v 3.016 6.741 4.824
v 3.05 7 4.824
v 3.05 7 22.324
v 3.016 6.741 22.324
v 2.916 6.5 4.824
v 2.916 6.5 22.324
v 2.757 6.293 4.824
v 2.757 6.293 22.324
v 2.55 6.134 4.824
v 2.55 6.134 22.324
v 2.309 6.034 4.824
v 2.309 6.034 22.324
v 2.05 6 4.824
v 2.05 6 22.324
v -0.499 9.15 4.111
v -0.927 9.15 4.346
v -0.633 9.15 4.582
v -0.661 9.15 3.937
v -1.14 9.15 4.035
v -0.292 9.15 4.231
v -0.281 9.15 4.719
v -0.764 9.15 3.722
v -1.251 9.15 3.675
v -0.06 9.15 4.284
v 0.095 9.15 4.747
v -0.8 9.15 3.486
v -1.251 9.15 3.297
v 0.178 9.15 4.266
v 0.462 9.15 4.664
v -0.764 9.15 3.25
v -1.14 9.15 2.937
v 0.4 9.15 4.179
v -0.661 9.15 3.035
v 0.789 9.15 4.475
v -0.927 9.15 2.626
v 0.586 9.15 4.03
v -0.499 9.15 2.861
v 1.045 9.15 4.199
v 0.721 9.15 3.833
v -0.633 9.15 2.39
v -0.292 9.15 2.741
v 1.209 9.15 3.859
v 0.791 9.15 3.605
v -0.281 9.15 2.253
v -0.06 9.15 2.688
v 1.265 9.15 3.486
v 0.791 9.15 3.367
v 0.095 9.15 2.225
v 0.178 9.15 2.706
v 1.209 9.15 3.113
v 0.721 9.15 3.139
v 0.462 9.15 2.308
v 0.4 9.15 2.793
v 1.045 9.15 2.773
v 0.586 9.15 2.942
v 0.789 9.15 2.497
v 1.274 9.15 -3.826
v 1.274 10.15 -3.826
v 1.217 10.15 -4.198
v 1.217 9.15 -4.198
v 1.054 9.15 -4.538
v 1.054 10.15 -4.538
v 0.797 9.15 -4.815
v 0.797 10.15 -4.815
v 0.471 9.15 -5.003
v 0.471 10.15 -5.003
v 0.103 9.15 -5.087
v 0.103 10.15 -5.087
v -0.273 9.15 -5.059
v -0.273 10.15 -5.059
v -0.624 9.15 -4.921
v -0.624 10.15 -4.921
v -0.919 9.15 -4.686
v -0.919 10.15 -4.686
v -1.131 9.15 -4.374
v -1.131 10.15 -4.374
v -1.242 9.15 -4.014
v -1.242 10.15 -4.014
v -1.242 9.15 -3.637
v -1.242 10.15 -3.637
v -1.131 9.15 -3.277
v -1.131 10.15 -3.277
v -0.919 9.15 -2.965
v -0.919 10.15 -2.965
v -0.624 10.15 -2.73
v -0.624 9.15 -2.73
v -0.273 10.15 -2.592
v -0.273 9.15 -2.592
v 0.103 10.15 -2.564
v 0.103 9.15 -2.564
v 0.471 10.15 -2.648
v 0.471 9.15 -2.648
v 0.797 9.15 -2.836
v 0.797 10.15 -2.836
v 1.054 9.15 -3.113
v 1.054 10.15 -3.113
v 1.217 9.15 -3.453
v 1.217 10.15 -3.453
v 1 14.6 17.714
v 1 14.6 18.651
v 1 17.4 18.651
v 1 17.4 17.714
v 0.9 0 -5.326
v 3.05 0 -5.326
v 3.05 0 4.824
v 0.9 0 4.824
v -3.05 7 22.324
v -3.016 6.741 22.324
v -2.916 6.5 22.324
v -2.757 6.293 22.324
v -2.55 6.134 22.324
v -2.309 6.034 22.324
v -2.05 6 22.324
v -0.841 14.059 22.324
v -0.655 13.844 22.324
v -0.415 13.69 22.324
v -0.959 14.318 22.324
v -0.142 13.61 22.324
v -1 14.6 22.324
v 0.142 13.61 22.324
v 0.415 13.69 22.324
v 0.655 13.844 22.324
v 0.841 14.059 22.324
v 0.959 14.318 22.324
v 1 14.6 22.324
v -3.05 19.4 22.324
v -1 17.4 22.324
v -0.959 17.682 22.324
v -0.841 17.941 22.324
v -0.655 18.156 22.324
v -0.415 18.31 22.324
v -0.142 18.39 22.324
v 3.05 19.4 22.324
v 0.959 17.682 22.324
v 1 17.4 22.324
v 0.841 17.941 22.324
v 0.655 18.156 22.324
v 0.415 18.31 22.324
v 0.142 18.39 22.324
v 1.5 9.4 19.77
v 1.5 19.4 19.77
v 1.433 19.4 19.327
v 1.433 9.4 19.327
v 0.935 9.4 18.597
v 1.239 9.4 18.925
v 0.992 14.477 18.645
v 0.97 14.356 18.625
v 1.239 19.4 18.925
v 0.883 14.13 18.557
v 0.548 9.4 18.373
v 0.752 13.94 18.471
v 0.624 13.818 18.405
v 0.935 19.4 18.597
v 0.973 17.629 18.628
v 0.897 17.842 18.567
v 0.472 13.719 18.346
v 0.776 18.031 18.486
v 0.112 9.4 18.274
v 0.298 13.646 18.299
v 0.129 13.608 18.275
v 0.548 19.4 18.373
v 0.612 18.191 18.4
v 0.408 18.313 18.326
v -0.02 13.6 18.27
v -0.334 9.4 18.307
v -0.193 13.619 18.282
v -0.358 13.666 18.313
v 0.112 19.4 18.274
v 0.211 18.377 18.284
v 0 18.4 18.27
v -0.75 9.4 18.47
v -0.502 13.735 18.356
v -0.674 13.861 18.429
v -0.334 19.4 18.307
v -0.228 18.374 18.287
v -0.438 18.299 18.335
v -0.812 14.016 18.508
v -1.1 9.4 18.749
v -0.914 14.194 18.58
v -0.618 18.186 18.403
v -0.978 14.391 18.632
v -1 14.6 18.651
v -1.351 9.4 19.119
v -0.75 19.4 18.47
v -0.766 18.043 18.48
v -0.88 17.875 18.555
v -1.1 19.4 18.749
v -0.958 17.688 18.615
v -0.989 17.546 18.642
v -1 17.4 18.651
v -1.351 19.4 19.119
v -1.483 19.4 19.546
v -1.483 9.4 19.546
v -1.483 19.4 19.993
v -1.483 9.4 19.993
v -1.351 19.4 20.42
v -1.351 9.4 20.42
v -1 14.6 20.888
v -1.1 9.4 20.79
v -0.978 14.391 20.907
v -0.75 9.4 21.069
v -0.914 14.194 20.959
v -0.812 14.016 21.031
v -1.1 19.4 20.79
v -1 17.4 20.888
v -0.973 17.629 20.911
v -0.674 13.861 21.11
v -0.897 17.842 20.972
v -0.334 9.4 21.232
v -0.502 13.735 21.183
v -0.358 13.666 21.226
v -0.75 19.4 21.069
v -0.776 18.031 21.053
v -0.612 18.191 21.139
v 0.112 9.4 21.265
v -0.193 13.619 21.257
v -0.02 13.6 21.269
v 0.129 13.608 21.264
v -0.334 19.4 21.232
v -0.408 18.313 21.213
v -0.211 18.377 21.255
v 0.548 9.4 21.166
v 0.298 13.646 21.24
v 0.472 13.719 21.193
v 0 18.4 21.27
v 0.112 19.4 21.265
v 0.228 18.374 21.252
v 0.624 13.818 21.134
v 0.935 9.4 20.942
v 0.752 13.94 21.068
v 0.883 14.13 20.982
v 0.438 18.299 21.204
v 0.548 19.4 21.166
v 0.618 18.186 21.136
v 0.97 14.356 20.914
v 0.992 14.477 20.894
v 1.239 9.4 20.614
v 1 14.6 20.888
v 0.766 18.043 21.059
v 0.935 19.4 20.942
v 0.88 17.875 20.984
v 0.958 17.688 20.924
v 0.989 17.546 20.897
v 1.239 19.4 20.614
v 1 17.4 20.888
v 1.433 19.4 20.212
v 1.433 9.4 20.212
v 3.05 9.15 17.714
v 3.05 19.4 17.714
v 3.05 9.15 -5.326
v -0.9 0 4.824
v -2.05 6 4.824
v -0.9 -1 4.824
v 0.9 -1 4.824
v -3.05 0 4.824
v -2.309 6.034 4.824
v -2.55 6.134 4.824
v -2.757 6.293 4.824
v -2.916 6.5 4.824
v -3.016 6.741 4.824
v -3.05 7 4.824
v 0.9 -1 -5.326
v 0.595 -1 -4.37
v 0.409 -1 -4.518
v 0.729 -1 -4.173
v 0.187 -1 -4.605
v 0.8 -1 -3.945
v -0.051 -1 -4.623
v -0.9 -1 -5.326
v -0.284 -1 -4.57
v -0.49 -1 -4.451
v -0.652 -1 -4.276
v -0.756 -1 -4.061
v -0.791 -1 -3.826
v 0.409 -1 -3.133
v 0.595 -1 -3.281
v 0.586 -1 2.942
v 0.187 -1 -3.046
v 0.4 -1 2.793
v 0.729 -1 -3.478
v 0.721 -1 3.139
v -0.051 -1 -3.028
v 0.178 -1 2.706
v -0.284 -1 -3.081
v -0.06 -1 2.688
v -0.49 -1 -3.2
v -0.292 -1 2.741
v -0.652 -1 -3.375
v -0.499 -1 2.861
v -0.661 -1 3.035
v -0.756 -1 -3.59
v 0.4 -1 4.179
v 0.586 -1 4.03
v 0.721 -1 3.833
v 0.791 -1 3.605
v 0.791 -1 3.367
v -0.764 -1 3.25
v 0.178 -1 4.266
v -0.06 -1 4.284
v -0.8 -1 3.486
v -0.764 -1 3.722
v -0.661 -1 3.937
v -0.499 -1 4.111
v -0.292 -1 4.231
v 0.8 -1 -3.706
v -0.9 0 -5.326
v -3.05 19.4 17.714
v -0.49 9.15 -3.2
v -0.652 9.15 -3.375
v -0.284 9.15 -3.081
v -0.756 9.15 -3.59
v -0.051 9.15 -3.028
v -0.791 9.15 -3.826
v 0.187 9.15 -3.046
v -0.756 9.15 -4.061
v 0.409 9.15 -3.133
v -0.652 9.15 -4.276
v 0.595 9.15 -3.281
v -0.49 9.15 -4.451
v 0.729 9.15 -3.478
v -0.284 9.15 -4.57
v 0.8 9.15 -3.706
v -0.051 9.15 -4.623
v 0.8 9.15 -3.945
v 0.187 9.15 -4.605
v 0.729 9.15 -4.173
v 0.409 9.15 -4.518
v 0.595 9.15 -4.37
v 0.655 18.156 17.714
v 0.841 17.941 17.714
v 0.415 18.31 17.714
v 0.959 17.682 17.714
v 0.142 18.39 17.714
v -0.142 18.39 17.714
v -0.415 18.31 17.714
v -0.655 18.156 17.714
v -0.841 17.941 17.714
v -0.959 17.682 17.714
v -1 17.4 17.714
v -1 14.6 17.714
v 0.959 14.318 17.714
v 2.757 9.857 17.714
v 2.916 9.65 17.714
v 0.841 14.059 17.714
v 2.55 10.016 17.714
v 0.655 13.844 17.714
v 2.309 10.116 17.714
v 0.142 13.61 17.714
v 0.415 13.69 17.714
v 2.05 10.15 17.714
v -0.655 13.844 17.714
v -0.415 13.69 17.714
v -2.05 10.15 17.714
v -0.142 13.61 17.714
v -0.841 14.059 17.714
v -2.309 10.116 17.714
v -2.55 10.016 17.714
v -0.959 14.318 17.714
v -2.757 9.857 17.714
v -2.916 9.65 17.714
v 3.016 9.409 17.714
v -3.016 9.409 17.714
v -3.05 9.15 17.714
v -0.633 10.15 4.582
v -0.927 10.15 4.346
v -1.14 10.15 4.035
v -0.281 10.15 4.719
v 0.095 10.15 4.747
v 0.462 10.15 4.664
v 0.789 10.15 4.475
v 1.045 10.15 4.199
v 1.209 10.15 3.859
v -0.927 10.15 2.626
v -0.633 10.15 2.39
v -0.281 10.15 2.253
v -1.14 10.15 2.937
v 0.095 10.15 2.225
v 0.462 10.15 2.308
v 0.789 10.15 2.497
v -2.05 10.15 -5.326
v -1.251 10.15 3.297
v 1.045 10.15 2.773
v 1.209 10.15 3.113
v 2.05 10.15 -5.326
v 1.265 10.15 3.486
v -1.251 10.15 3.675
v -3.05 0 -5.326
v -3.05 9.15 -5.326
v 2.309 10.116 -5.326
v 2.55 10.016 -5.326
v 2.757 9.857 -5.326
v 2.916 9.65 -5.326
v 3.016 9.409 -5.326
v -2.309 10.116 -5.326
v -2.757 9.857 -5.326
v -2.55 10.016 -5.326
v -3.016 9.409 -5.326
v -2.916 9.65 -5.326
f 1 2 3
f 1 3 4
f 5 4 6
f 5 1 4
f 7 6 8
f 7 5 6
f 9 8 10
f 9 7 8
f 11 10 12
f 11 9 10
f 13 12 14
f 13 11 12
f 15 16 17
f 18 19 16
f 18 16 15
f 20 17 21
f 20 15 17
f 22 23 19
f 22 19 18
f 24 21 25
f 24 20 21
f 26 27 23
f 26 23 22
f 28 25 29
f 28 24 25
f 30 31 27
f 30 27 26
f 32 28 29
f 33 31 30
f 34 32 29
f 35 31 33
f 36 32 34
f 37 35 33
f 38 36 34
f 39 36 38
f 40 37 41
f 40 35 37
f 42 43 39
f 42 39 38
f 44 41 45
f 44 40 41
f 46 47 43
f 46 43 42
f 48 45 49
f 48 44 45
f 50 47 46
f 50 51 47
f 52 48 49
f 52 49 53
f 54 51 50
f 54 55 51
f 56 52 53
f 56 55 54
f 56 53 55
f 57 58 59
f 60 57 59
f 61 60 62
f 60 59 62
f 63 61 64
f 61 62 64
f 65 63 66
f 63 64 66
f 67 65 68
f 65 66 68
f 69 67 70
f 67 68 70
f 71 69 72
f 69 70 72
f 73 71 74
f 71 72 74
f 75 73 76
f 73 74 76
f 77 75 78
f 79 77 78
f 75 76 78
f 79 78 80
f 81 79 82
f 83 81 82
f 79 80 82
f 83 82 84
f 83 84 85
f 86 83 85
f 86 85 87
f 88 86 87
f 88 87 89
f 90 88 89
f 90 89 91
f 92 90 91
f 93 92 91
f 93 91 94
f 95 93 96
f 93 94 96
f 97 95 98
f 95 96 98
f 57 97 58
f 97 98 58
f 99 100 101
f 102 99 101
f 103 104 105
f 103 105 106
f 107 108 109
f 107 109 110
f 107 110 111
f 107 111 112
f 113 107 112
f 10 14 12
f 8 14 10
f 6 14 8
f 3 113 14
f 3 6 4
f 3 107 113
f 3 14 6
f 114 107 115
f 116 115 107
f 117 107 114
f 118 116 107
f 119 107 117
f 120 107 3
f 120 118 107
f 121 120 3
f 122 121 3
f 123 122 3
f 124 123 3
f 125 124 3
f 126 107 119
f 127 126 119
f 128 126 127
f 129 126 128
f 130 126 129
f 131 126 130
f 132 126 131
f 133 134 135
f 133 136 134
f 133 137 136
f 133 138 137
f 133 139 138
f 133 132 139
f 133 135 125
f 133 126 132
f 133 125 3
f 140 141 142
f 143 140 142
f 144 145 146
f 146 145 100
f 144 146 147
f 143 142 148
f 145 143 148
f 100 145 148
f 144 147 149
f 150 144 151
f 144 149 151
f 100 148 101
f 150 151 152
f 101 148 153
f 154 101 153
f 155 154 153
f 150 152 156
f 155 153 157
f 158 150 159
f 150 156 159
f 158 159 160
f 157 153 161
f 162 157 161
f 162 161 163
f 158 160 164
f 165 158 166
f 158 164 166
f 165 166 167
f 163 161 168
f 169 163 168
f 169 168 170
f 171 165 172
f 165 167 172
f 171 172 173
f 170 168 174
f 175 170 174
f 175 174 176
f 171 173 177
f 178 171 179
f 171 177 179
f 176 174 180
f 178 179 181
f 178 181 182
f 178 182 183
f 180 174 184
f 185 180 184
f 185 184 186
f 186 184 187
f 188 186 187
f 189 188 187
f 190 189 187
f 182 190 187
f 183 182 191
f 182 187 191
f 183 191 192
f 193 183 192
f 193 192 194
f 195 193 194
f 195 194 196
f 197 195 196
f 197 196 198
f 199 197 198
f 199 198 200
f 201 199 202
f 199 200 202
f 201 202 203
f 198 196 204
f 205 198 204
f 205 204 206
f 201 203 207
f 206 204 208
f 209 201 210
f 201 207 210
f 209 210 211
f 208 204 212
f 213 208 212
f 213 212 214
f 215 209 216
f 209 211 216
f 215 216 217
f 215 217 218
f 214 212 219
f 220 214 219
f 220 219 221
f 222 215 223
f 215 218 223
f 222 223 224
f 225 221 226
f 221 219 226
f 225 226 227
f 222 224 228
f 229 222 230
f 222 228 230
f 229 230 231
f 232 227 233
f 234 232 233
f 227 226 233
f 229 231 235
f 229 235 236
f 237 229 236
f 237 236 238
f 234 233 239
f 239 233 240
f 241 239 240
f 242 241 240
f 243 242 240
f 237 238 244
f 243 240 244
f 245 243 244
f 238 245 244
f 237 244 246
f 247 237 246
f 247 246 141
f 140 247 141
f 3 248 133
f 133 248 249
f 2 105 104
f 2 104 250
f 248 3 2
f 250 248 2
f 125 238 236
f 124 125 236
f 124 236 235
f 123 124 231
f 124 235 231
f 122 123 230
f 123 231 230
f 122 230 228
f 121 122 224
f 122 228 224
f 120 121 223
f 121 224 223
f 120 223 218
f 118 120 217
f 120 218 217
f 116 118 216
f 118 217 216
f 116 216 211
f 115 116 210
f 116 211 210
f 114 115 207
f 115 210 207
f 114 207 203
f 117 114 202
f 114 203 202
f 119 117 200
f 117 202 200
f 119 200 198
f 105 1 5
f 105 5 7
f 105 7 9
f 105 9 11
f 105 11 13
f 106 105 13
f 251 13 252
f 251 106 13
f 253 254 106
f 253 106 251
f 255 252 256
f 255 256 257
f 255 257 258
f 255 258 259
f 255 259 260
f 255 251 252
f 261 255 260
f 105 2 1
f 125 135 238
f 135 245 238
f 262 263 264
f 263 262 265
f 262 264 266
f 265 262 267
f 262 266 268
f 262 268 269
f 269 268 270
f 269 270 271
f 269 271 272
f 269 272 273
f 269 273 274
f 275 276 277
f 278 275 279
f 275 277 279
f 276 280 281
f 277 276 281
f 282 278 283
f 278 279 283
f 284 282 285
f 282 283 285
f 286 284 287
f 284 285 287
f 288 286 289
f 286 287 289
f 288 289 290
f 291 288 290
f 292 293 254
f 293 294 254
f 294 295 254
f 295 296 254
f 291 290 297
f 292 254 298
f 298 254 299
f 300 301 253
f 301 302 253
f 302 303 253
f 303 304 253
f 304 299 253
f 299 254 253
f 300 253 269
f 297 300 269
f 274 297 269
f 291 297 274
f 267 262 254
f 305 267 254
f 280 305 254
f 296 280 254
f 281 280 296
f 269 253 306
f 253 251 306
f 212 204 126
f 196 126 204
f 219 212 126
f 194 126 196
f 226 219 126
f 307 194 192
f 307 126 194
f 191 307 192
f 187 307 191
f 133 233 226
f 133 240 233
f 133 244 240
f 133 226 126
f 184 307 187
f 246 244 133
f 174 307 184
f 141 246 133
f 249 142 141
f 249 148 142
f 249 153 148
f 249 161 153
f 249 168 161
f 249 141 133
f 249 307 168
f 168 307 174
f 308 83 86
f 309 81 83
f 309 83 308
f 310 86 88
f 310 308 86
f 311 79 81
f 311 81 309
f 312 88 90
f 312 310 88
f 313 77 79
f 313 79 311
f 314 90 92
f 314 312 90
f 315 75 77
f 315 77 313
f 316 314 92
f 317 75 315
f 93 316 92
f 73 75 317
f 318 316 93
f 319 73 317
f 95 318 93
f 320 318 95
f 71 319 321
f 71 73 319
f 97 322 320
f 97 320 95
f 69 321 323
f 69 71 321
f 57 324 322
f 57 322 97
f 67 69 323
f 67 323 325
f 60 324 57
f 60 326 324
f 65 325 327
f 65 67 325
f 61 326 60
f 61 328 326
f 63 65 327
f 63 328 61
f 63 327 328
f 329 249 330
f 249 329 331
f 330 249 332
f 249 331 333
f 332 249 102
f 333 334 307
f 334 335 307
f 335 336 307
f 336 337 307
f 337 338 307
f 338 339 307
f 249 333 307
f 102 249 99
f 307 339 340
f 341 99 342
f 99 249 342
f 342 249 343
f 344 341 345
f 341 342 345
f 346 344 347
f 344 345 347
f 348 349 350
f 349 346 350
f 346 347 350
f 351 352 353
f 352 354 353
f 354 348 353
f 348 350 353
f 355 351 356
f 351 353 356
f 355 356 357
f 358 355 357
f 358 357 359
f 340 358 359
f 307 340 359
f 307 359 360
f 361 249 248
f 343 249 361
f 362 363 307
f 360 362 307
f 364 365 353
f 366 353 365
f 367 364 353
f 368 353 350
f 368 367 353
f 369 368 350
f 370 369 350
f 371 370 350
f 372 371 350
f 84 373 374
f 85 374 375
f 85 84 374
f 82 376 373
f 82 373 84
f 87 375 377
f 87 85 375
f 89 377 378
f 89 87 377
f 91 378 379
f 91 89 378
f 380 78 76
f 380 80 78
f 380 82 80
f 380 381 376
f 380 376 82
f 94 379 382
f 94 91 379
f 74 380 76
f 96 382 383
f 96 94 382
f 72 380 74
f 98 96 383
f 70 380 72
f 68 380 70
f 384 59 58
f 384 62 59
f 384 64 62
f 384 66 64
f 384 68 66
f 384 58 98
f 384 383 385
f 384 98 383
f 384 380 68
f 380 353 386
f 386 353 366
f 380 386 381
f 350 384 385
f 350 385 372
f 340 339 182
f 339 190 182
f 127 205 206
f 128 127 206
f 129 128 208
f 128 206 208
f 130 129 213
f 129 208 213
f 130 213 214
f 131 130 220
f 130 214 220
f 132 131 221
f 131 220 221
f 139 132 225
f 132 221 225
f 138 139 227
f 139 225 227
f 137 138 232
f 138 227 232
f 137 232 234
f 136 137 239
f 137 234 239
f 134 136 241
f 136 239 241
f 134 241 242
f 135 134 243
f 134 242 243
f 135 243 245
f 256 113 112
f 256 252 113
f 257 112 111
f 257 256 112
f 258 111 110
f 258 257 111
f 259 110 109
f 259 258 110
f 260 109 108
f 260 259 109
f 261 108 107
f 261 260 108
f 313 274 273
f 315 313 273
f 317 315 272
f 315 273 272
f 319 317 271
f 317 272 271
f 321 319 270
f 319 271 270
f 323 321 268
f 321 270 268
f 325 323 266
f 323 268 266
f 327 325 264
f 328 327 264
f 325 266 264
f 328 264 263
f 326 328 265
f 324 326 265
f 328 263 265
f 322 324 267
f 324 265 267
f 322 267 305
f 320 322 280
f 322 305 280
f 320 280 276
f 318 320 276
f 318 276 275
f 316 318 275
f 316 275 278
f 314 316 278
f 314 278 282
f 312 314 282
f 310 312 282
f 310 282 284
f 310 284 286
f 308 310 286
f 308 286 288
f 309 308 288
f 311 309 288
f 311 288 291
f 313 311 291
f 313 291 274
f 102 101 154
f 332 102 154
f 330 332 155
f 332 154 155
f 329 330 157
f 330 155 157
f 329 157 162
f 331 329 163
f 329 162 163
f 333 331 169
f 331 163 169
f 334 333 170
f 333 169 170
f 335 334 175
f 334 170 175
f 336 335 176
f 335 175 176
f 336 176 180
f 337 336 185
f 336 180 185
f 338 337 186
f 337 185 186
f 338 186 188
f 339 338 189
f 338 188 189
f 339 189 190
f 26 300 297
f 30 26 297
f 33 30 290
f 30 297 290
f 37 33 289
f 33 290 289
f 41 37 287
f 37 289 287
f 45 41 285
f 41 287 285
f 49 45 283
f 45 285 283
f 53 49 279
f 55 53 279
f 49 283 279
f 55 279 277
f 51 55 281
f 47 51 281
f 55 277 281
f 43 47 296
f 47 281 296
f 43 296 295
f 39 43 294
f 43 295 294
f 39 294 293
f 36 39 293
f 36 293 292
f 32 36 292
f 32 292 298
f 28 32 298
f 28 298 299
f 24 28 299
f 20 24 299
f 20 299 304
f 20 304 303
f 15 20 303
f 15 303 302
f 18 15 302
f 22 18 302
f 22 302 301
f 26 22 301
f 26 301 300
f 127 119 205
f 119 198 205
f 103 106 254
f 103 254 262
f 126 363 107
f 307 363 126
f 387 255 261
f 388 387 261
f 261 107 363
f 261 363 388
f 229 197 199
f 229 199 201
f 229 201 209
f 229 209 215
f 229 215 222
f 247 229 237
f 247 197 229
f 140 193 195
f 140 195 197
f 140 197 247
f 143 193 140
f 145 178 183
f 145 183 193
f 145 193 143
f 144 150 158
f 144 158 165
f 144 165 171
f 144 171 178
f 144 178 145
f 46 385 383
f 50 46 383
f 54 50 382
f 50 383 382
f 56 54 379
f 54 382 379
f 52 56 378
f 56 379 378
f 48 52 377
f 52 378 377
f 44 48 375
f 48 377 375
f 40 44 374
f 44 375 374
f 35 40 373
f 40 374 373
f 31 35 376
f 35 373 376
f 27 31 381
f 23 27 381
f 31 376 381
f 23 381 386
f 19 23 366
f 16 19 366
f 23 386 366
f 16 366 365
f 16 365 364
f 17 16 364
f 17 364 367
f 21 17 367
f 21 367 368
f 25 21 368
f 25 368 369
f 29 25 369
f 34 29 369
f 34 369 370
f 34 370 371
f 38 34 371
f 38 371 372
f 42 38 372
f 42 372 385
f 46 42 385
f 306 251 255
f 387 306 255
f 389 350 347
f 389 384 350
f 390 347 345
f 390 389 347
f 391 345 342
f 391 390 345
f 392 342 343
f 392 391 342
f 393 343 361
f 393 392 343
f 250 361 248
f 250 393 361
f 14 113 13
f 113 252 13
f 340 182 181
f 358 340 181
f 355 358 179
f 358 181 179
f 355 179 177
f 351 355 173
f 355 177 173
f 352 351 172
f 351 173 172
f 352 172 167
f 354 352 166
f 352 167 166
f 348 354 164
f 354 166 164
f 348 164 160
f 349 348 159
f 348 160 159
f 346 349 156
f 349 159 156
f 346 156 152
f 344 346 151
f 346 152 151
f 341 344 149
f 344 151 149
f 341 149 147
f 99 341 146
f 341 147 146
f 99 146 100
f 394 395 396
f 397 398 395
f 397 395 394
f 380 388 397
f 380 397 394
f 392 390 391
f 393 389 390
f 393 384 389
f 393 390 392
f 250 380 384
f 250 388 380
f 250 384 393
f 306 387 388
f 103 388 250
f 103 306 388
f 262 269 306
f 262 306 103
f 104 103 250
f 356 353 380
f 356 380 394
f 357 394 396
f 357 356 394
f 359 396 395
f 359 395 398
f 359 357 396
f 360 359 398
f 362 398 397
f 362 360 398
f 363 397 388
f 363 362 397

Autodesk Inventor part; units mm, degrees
ref_plane "YZ Plane" through (0, 0, 0) normal (1, 0, 0) x (0, 1, 0)
ref_plane "XZ Plane" through (0, 0, 0) normal (0, 1, 0) x (-1, 0, 0)
ref_plane "XY Plane" through (0, 0, 0) normal (0, 0, 1) x (1, 0, 0)
sketch "Sketch1" plane through (0, 0, 0) normal (0, 1, 0) x (-1, 0, 0)
  line L0 (3.05, -5.3255) -> (-3.05, -5.3255)
  line L1 (-3.05, -5.3255) -> (-3.05, 4.8245)
  line L2 (-3.05, 4.8245) -> (3.05, 4.8245)
  line L3 (3.05, 4.8245) -> (3.05, -5.3255)
  line L4 (0.9, 4.8245) -> (-0.9, 4.8245)
  line L5 (0.9, 4.8245) -> (0.9, -5.3255)
  line L6 (-0.9, 4.8245) -> (-0.9, -5.3255)
  circle A0 centre (0, 3.486) radius 0.8
  circle A1 centre (-0.0087, -3.8255) radius 0.8
  line L7 (0, 4.8245) -> (0, -5.3255)
  line L8 (-3.05, 0) -> (3.05, 0)
  point P0 (0, 0)
  dimension "d13" = 6.1
  dimension "d44" = 1.8
  dimension "d45" = 2.15
  dimension "d46" = 1.6
  dimension "d47" = 1.6
extrude "Extrusion1" add sketch "Sketch1" along normal blind 10.15 contours L0 L5 L8 L3 | L0 L7 A1 L8 L5 | L8 L5 L2 L3 | L0 L6 L8 L7 A1 | L8 L7 A0 L2 L5 | L0 L1 L8 L6 | L8 L6 L2 L7 A0 | L8 L1 L2 L6
sketch "Sketch11" plane through (-3.05, 0, 4.8245) normal (0, 0, 1) x (1, 0, 0)
  point P0 (3.05, 0)
extrude "Extrusion6" add sketch "Sketch1" against normal blind 1 contours L0 L7 A1 L8 L5 | L0 L6 L8 L7 A1 | L8 L7 A0 L2 L5 | L8 L6 L2 L7 A0
sketch "Sketch12" plane through (0, 10.15, 0) normal (0, 1, 0) x (1, 0, 0)
  circle A0 centre (0.0087, 3.8255) radius 1.265
  circle A1 centre (0, -3.486) radius 1.265
  circle A2 centre (0, -3.486) radius 0.8 projected
  circle A3 centre (0.0087, 3.8255) radius 0.8 projected
  point P0 (0, 0)
  dimension "d52" = 2.53
  dimension "d53" = 2.53
extrude "Extrusion7" cut sketch "Sketch12" against normal blind 1 contours A0 | A1 | A2 | A3
sketch "Sketch13" plane through (-3.05, 10.15, 4.8245) normal (0, 0, 1) x (1, 0, 0)
  line L0 (0, 0) -> (0, -4.15)
  line L1 (0, -10.15) -> (0, 0) projected
  line L2 (0, -4.15) -> (6.1, -4.15)
  line L3 (6.1, -10.15) -> (6.1, 0) projected
  line L4 (6.1, 0) -> (6.1, -4.15)
  line L5 (0, 0) -> (6.1, 0)
  point P0 (3.05, -10.15)
  dimension "d56" = 4.15
extrude "Extrusion8" add sketch "Sketch13" along normal blind 17
sketch "Sketch17" plane through (-3.05, 10.15, 21.8245) normal (0, 0, 1) x (1, 0, 0)
  line L0 (6.1, 0) -> (0, 0) projected
  line L1 (6.1, 0) -> (14.3904, 5.5919)
  line L2 (6.1, 0) -> (16.1, 0) construction
  line L3 (14.3904, 5.5919) -> (10.1964, 11.8097)
  line L4 (10.1964, 11.8097) -> (13.5955, 14.1024)
  line L5 (13.5955, 14.1024) -> (17.7894, 7.8846)
  line L6 (17.7894, 7.8846) -> (19.7132, 5.0325)
  line L7 (6.1, -10.15) -> (6.1, -4.15) projected
  line L8 (19.7132, 5.0325) -> (6.1, -4.15)
  line L9 (6.1, 0) -> (6.1, -4.15)
  point P0 (3.05, -10.15)
  dimension "d72" = 10
  dimension "d73" = 34
  dimension "d74" = 7.5
  dimension "d75" = 4.1
extrude "Extrusion12" [suppressed]
sketch "Sketch14" plane through (0, 10.15, 0) normal (0, 1, 0) x (1, 0, 0)
  line L0 (3.05, 5.3255) -> (3.05, -21.8245) projected
  line L1 (3.05, -21.8245) -> (3.05, -17.7145)
  line L2 (3.05, -17.7145) -> (-3.05, -17.7145)
  line L3 (-3.05, 5.3255) -> (-3.05, -21.8245) projected
  line L4 (-3.05, -21.8245) -> (3.05, -21.8245)
  point P0 (0, 0)
  dimension "d59" = 4.11
extrude "Extrusion9" add sketch "Sketch14" along normal blind 9.25
sketch "Sketch16" plane through (0, 19.4, 0) normal (0, 1, 0) x (1, 0, 0)
  circle A0 centre (0, -19.7695) radius 1.5
  line L0 (-3.05, -21.8245) -> (3.05, -21.8245) projected
  line L1 (3.05, -21.8245) -> (3.05, -17.7145) projected
  point P0 (0, 0)
  point P1 (0, -21.8245)
  dimension "d67" = 3
  dimension "d68" = 2.055
  dimension "d69" = 3.05
extrude "Extrusion11" cut sketch "Sketch16" against normal blind 10
sketch "Sketch15" plane through (-3.05, 10.15, 21.8245) normal (0, 0, 1) x (1, 0, 0)
  line L0 (3.05, 7.25) -> (3.05, 4.45) construction
  line L1 (6.1, 0) -> (6.1, 9.25) projected
  line L2 (2.05, 7.25) -> (2.05, 4.45)
  line L3 (4.05, 4.45) -> (4.05, 7.25)
  arc A0 (4.05, 7.25) -> (2.05, 7.25) centre (3.05, 7.25) ccw
  arc A1 (2.05, 4.45) -> (4.05, 4.45) centre (3.05, 4.45) ccw
  line L4 (0, 9.25) -> (6.1, 9.25) projected
  line L5 (3.05, 9.25) -> (3.05, 8.25)
  point P0 (3.05, -10.15)
  point P1 (3.05, 5.85)
  dimension "d62" = 1.4
  dimension "d63" = 2
  dimension "d64" = 3.05
  dimension "d94" = 2.05
  dimension "d97" = 1
extrude "Extrusion10" cut sketch "Sketch15" against normal through all
sketch "Sketch20" plane through (10.5455, 24.2524, 21.8245) normal (-0.5591929, 0.8290376, 0) x (0.8290376, 0.5591929, 0)
  circle A0 centre (-2.05, 2.05) radius 1.5
  line L0 (-4.1, 0) -> (-4.1, 4.1) projected
  line L1 (0, 0) -> (-4.1, 0) projected
  point P0 (-22.3044, 21.8245)
  point P1 (-2.05, 0)
  dimension "d82" = 3
  dimension "d83" = 2.05
  dimension "d84" = 2.05
extrude "Extrusion14" [suppressed]
sketch "Sketch18" plane through (-3.05, 10.15, 21.8245) normal (0, 0, 1) x (1, 0, 0)
  line L0 (12.6984, 11.7664) -> (14.2641, 9.4451) construction
  line L1 (11.973, 11.2771) -> (13.5387, 8.9558)
  line L2 (14.9895, 9.9344) -> (13.4238, 12.2557)
  arc A0 (13.4238, 12.2557) -> (11.973, 11.2771) centre (12.6984, 11.7664) ccw
  arc A1 (13.5387, 8.9558) -> (14.9895, 9.9344) centre (14.2641, 9.4451) ccw
  line L3 (19.7132, 5.0325) -> (13.5955, 14.1024) projected
  line L4 (10.1964, 11.8097) -> (13.5955, 14.1024) projected
  point P0 (3.05, -10.15)
  point P1 (13.4813, 10.6057)
  point P2 (12.2091, 12.4918)
  dimension "d78" = 1.4
  dimension "d79" = 1.75
  dimension "d89" = 0.56
  dimension "d90" = 2.05
extrude "Extrusion13" cut sketch "Sketch18" against normal blind 4.1
sketch "Sketch21" plane through (13.8787, 15.6447, 19.7745) normal (-0.5591929, 0.8290376, 0) x (0.8290376, 0.5591929, 0)
  circle A0 centre (0, 0) radius 0.868
  point P0 (-20.2544, 19.7745)
extrude "Extrusion15" [suppressed]
mirror "Mirror3" about plane through (0, 0, 0) normal (1, 0, 0) of "Extrusion13"
fillet "Fillet1" radius 1 2 edges at (3.05, 10.15, 6.1945) (-3.05, 10.15, 6.1945)
fillet "Fillet2" [suppressed]
fillet "Fillet3" radius 1 2 edges at (3.05, 6, 13.3245) (-3.05, 6, 13.3245)
sketch "Sketch33" plane through (-3.05, 10.15, 21.8245) normal (0, 0, 1) x (1, 0, 0)
  line L0 (4.05, 7.25) -> (4.05, 4.45) projected
  arc A0 (2.05, 4.45) -> (4.05, 4.45) centre (3.05, 4.45) ccw projected
  line L1 (2.05, 4.45) -> (2.05, 7.25) projected
  arc A1 (4.05, 7.25) -> (2.05, 7.25) centre (3.05, 7.25) ccw projected
  arc A2 (0, -3.15) -> (1, -4.15) centre (1, -3.15) ccw projected
  line L2 (1, -4.15) -> (5.1, -4.15) projected
  arc A3 (5.1, -4.15) -> (6.1, -3.15) centre (5.1, -3.15) ccw projected
  line L3 (6.1, -3.15) -> (6.1, 9.25) projected
  line L4 (0, 9.25) -> (6.1, 9.25) projected
  line L5 (0, -3.15) -> (0, 9.25) projected
  point P0 (3.05, -10.15)
extrude "Extrusion17" add sketch "Sketch33" along normal blind 0.5
sketch "Sketch22" plane through (0, 9.4, 19.7695) normal (0, 1, 0) x (1, 0, 0)
  circle A0 centre (0, 0) radius 1.5 projected
  point P0 (0, 19.7695)
extrude "Extrusion16" [suppressed]
equation "\"d13\" = base_width"
equation "\"d45\" = -0.5 * d44 + 0.5 * d13"
equation "\"d4\" = base_length"
equation "\"base_width\" = 6.1"
equation "\"base_length\" = 10.15"
equation "\"base_screw_diameter\" = 1.5"
equation "\"base_screw_spacing_edge\" = 8.5"
equation "\"multi_angle\" = 34deg"
properties part number "reinforced_holder"
